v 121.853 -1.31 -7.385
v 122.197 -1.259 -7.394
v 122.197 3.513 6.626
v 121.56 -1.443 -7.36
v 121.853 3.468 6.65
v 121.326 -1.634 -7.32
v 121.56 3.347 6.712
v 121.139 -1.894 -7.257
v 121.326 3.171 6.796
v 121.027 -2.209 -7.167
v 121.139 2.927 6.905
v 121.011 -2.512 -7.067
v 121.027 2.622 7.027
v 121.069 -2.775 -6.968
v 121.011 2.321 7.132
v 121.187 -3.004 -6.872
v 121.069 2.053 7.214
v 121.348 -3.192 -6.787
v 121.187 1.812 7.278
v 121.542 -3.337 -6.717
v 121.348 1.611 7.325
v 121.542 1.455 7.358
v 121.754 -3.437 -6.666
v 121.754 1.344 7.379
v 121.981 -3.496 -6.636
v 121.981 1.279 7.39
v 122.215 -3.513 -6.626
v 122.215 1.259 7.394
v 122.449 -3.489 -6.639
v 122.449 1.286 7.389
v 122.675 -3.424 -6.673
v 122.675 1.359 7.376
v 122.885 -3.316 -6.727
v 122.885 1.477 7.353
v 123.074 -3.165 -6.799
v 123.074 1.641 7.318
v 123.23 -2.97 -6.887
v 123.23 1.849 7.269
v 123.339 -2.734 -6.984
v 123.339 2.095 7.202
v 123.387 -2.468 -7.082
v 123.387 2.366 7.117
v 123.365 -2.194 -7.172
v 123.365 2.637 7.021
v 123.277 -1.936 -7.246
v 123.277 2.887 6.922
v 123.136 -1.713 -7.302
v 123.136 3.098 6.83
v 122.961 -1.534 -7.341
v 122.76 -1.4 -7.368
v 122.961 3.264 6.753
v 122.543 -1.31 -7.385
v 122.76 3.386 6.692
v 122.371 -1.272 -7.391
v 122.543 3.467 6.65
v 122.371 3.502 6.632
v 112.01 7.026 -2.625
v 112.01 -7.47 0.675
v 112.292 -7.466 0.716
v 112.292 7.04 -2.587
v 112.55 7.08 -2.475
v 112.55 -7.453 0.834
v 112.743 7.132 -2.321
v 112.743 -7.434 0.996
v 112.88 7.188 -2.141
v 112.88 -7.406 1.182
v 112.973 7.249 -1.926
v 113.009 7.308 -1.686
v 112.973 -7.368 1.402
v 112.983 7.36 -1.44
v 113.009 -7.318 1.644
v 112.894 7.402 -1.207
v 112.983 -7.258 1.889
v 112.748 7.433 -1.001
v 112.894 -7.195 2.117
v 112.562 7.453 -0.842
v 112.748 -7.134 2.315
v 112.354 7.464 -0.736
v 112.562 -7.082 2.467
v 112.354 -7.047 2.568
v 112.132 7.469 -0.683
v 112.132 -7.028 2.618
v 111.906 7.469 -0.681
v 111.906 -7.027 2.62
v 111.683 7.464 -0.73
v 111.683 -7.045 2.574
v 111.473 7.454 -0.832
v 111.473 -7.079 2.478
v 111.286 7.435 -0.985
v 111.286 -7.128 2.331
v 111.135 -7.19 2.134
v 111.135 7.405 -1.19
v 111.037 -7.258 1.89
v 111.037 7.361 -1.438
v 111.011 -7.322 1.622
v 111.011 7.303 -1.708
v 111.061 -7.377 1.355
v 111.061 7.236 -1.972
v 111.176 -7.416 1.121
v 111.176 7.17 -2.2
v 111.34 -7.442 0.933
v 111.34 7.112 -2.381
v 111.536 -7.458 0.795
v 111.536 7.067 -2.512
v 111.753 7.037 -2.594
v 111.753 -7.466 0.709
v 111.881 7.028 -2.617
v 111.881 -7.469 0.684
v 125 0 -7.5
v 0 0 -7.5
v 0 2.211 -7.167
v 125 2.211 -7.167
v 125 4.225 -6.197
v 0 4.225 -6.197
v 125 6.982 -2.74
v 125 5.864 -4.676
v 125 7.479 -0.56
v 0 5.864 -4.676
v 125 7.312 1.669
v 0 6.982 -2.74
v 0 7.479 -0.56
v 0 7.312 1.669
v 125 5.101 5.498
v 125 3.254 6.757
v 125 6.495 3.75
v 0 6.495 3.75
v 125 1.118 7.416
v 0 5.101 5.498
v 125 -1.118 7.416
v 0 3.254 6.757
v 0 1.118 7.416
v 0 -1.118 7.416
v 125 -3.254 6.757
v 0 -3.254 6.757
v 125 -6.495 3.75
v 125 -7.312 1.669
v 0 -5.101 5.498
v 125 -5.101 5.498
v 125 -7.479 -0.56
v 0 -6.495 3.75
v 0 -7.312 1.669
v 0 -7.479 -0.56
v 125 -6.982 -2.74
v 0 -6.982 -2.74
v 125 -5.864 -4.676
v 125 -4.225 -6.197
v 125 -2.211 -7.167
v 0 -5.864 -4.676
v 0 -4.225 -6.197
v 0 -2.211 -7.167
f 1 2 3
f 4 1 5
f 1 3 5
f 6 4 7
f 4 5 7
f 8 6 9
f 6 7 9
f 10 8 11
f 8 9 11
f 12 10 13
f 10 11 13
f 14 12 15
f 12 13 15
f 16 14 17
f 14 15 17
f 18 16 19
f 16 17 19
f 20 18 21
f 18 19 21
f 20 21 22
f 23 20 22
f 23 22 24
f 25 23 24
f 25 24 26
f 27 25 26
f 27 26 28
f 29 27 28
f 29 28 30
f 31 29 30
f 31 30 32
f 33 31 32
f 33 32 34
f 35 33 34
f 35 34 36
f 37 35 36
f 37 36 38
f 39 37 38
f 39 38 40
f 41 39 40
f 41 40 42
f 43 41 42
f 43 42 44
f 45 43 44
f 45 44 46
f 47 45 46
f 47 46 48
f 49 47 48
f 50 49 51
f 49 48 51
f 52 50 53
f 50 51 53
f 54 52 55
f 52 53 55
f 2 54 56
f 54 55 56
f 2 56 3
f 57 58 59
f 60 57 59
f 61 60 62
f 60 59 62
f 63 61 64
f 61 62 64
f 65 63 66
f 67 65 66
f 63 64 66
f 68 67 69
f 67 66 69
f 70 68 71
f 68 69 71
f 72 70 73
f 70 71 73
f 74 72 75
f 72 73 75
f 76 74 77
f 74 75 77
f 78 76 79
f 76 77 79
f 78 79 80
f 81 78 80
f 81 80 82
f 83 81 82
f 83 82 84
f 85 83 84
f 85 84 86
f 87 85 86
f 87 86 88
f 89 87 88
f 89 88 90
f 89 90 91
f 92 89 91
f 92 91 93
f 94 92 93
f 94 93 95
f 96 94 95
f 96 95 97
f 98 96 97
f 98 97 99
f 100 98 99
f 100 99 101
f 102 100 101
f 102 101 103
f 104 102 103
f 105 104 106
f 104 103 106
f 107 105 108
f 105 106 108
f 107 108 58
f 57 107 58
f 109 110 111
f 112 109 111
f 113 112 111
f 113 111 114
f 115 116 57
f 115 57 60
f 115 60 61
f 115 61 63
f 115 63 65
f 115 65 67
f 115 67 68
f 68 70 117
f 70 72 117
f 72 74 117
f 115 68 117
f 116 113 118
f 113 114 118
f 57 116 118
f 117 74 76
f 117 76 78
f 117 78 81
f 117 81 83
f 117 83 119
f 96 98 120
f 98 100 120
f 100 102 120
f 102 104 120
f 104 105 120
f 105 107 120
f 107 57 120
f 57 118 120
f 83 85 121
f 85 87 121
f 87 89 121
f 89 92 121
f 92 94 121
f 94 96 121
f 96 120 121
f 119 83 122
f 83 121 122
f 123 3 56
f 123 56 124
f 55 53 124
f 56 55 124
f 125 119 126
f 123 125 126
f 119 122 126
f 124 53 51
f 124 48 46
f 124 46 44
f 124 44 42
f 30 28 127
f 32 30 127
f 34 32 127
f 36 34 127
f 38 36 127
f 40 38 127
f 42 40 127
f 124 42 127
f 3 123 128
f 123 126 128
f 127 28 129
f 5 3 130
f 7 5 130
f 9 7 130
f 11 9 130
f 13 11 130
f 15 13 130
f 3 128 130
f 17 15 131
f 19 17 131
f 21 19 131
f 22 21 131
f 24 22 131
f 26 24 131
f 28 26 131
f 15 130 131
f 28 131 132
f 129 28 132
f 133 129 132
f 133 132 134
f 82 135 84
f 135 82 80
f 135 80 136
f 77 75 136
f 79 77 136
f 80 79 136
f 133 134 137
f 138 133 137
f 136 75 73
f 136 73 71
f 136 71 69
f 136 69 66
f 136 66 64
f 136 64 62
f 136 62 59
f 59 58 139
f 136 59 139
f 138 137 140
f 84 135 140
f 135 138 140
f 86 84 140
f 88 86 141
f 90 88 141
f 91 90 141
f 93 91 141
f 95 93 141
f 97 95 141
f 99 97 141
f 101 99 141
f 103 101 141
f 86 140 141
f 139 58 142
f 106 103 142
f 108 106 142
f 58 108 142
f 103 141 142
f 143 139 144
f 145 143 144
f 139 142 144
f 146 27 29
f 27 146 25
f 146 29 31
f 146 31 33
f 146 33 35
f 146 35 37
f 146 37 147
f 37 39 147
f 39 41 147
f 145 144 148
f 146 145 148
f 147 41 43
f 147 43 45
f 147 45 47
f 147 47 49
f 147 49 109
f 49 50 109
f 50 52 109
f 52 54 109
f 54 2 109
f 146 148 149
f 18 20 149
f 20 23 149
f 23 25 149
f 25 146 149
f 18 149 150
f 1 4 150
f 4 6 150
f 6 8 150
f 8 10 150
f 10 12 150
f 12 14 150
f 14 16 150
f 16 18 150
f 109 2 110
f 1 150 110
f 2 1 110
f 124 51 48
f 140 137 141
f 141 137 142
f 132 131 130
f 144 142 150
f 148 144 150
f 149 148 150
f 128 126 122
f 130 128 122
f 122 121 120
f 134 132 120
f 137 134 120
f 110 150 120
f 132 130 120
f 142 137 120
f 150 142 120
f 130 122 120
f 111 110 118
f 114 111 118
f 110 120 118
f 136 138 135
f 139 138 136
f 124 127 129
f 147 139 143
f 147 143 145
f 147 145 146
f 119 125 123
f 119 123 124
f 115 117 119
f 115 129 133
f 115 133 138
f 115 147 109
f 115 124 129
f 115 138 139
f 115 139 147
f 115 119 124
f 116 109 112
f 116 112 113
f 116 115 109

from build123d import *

# Parameters (mm, degrees)
SKETCH1_R                       = 7.5
BOSS_EXTRUDE1_DEPTH             = 125
F_3_32_0_09375_DIAMETER_HOLE1_D = 2.38125
F_2MM_DIAMETER_HOLE_D           = 2


with BuildPart() as part:
    # Sketch1 → Boss-Extrude1 (new body)
    with BuildSketch(Plane(origin=(0, 0, 0), x_dir=(0, 0, -1), z_dir=(1, 0, 0))):
        Circle(SKETCH1_R)
    extrude(amount=BOSS_EXTRUDE1_DEPTH)

    # 3/32 (0.09375) Diameter Hole1 (through all)
    with Locations(Plane(origin=(122.197095896, -2.4168895, -7.099904587), x_dir=(0, -0.946653944928, 0.322251933358), z_dir=(0, -0.322251933358, -0.946653944928))):
        with Locations((0, 0)):
            Hole(F_3_32_0_09375_DIAMETER_HOLE1_D / 2)

    # 2mm Diameter Hole (through all)
    with Locations(Plane(origin=(112.009618943, 7.312828958, -1.665092378), x_dir=(0, 0.222012317051, 0.975043861105), z_dir=(0, 0.975043861105, -0.222012317051))):
        with Locations((0, 0)):
            Hole(F_2MM_DIAMETER_HOLE_D / 2)


solid = part.part
